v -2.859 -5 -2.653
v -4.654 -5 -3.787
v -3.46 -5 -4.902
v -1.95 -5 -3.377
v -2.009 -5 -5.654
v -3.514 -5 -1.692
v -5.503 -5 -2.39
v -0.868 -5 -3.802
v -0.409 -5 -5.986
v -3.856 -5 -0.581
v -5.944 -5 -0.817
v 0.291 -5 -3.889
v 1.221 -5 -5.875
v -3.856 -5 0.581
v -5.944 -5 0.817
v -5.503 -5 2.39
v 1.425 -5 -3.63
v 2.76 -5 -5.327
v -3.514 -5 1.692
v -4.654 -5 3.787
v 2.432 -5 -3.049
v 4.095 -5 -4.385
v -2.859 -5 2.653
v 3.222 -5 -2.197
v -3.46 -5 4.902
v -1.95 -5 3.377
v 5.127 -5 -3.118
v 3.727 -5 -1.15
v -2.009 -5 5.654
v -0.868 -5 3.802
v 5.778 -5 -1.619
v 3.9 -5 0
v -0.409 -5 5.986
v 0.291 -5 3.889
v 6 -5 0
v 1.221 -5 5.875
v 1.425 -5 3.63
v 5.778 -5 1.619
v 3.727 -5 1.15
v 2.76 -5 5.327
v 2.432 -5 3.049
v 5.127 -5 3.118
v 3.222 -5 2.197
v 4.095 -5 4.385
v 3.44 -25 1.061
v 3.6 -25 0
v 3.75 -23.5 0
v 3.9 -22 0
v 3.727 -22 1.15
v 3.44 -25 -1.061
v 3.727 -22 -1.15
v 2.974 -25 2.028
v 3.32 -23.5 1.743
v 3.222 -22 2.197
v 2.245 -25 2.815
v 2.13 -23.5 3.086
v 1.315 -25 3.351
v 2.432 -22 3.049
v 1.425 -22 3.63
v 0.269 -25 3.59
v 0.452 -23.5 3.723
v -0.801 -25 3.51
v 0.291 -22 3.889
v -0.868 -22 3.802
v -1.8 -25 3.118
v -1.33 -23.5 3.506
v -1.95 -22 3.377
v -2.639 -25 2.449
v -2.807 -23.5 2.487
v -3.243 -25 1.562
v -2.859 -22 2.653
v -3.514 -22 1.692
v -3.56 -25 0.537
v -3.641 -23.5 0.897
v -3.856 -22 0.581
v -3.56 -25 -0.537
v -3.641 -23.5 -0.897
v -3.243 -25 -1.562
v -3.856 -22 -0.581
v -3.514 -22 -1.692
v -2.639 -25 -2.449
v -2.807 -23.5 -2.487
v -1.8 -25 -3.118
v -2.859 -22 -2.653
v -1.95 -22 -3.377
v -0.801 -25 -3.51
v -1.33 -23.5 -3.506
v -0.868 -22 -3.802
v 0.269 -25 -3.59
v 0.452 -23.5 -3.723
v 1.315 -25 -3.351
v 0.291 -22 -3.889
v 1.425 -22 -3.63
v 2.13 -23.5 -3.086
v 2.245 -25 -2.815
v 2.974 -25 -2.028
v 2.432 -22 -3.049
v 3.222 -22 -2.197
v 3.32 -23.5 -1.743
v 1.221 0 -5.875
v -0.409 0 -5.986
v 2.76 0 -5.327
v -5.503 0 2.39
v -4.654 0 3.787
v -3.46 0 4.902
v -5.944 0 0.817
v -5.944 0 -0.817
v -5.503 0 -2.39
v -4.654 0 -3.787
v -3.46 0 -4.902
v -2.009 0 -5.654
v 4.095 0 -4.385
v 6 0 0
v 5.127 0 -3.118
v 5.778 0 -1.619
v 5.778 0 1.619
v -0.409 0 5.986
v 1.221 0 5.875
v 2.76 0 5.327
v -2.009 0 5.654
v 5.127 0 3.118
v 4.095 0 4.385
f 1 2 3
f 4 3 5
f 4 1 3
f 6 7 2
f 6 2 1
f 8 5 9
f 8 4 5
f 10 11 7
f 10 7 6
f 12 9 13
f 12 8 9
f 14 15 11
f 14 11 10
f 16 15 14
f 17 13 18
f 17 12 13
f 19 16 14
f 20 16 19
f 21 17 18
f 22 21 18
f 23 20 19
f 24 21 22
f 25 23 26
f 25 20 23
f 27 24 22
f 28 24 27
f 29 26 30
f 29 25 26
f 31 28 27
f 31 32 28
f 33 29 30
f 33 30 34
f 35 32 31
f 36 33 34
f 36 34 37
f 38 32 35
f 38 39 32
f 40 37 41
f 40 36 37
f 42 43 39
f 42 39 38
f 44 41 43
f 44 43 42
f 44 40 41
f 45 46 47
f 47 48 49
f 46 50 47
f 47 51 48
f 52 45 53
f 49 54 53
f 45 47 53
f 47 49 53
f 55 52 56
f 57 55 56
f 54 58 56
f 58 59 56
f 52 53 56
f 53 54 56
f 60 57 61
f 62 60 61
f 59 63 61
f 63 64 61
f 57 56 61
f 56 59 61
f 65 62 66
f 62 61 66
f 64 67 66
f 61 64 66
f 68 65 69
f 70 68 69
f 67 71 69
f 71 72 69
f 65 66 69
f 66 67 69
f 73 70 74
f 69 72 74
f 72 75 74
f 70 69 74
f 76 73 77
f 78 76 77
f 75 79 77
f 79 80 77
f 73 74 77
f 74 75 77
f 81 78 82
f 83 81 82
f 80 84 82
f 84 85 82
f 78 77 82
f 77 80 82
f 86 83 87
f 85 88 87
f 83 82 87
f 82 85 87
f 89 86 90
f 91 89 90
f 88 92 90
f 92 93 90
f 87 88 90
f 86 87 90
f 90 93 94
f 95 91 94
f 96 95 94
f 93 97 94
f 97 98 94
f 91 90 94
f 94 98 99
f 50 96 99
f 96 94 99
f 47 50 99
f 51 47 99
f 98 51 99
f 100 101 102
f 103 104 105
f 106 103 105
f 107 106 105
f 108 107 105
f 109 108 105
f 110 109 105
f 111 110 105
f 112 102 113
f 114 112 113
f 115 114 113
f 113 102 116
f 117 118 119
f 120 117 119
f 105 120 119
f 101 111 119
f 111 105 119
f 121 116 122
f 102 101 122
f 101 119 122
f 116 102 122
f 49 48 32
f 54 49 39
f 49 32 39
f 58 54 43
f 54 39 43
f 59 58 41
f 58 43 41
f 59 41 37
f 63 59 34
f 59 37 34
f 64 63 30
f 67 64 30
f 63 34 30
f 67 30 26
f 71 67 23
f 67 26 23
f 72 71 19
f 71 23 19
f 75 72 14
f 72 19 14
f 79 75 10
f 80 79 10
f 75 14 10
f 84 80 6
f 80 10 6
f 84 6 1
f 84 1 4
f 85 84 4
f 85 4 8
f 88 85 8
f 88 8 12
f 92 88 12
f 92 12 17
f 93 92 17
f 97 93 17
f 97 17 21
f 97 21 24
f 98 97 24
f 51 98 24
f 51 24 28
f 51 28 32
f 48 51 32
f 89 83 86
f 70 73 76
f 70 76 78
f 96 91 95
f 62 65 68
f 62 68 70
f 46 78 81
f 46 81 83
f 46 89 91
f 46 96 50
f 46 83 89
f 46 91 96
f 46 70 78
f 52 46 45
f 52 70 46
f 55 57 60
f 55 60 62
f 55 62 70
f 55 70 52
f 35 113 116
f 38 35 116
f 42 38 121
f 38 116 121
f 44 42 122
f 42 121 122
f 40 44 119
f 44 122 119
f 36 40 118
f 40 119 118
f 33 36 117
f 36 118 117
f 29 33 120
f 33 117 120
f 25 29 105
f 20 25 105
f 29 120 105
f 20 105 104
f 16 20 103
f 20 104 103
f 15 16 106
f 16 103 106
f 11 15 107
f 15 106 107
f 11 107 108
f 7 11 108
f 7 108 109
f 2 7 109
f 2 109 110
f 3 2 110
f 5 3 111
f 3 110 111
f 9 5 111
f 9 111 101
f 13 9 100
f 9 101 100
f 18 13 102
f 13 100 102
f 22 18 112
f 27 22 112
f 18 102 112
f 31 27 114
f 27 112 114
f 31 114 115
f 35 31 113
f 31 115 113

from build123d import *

# Parameters (mm, degrees)
F0_R     = 3.9
F1_DEPTH = 25
F0_R_2   = 6
F2_DEPTH = 5
F3_SIZE2 = 3
F3_SIZE  = 0.3


with BuildPart() as f1:
    # F0 (on Front) → F1 (new body)
    with BuildSketch(Plane.XZ):
        Circle(F0_R)
    extrude(amount=F1_DEPTH)

    # F0 (on Front) → F2 (join)
    with BuildSketch(Plane.XZ):
        Circle(F0_R_2)
        Circle(F0_R, mode=Mode.SUBTRACT)
    extrude(amount=F2_DEPTH)

    # F3
    f3_edges = [f1.edges().sort_by_distance(p)[0] for p in [
        (-3.9, -25, 0),
    ]]
    f3_side = f1.faces().sort_by_distance((0, -25, 0))[0]
    chamfer(f3_edges, length=F3_SIZE, length2=F3_SIZE2, reference=f3_side)


solid = f1.part
